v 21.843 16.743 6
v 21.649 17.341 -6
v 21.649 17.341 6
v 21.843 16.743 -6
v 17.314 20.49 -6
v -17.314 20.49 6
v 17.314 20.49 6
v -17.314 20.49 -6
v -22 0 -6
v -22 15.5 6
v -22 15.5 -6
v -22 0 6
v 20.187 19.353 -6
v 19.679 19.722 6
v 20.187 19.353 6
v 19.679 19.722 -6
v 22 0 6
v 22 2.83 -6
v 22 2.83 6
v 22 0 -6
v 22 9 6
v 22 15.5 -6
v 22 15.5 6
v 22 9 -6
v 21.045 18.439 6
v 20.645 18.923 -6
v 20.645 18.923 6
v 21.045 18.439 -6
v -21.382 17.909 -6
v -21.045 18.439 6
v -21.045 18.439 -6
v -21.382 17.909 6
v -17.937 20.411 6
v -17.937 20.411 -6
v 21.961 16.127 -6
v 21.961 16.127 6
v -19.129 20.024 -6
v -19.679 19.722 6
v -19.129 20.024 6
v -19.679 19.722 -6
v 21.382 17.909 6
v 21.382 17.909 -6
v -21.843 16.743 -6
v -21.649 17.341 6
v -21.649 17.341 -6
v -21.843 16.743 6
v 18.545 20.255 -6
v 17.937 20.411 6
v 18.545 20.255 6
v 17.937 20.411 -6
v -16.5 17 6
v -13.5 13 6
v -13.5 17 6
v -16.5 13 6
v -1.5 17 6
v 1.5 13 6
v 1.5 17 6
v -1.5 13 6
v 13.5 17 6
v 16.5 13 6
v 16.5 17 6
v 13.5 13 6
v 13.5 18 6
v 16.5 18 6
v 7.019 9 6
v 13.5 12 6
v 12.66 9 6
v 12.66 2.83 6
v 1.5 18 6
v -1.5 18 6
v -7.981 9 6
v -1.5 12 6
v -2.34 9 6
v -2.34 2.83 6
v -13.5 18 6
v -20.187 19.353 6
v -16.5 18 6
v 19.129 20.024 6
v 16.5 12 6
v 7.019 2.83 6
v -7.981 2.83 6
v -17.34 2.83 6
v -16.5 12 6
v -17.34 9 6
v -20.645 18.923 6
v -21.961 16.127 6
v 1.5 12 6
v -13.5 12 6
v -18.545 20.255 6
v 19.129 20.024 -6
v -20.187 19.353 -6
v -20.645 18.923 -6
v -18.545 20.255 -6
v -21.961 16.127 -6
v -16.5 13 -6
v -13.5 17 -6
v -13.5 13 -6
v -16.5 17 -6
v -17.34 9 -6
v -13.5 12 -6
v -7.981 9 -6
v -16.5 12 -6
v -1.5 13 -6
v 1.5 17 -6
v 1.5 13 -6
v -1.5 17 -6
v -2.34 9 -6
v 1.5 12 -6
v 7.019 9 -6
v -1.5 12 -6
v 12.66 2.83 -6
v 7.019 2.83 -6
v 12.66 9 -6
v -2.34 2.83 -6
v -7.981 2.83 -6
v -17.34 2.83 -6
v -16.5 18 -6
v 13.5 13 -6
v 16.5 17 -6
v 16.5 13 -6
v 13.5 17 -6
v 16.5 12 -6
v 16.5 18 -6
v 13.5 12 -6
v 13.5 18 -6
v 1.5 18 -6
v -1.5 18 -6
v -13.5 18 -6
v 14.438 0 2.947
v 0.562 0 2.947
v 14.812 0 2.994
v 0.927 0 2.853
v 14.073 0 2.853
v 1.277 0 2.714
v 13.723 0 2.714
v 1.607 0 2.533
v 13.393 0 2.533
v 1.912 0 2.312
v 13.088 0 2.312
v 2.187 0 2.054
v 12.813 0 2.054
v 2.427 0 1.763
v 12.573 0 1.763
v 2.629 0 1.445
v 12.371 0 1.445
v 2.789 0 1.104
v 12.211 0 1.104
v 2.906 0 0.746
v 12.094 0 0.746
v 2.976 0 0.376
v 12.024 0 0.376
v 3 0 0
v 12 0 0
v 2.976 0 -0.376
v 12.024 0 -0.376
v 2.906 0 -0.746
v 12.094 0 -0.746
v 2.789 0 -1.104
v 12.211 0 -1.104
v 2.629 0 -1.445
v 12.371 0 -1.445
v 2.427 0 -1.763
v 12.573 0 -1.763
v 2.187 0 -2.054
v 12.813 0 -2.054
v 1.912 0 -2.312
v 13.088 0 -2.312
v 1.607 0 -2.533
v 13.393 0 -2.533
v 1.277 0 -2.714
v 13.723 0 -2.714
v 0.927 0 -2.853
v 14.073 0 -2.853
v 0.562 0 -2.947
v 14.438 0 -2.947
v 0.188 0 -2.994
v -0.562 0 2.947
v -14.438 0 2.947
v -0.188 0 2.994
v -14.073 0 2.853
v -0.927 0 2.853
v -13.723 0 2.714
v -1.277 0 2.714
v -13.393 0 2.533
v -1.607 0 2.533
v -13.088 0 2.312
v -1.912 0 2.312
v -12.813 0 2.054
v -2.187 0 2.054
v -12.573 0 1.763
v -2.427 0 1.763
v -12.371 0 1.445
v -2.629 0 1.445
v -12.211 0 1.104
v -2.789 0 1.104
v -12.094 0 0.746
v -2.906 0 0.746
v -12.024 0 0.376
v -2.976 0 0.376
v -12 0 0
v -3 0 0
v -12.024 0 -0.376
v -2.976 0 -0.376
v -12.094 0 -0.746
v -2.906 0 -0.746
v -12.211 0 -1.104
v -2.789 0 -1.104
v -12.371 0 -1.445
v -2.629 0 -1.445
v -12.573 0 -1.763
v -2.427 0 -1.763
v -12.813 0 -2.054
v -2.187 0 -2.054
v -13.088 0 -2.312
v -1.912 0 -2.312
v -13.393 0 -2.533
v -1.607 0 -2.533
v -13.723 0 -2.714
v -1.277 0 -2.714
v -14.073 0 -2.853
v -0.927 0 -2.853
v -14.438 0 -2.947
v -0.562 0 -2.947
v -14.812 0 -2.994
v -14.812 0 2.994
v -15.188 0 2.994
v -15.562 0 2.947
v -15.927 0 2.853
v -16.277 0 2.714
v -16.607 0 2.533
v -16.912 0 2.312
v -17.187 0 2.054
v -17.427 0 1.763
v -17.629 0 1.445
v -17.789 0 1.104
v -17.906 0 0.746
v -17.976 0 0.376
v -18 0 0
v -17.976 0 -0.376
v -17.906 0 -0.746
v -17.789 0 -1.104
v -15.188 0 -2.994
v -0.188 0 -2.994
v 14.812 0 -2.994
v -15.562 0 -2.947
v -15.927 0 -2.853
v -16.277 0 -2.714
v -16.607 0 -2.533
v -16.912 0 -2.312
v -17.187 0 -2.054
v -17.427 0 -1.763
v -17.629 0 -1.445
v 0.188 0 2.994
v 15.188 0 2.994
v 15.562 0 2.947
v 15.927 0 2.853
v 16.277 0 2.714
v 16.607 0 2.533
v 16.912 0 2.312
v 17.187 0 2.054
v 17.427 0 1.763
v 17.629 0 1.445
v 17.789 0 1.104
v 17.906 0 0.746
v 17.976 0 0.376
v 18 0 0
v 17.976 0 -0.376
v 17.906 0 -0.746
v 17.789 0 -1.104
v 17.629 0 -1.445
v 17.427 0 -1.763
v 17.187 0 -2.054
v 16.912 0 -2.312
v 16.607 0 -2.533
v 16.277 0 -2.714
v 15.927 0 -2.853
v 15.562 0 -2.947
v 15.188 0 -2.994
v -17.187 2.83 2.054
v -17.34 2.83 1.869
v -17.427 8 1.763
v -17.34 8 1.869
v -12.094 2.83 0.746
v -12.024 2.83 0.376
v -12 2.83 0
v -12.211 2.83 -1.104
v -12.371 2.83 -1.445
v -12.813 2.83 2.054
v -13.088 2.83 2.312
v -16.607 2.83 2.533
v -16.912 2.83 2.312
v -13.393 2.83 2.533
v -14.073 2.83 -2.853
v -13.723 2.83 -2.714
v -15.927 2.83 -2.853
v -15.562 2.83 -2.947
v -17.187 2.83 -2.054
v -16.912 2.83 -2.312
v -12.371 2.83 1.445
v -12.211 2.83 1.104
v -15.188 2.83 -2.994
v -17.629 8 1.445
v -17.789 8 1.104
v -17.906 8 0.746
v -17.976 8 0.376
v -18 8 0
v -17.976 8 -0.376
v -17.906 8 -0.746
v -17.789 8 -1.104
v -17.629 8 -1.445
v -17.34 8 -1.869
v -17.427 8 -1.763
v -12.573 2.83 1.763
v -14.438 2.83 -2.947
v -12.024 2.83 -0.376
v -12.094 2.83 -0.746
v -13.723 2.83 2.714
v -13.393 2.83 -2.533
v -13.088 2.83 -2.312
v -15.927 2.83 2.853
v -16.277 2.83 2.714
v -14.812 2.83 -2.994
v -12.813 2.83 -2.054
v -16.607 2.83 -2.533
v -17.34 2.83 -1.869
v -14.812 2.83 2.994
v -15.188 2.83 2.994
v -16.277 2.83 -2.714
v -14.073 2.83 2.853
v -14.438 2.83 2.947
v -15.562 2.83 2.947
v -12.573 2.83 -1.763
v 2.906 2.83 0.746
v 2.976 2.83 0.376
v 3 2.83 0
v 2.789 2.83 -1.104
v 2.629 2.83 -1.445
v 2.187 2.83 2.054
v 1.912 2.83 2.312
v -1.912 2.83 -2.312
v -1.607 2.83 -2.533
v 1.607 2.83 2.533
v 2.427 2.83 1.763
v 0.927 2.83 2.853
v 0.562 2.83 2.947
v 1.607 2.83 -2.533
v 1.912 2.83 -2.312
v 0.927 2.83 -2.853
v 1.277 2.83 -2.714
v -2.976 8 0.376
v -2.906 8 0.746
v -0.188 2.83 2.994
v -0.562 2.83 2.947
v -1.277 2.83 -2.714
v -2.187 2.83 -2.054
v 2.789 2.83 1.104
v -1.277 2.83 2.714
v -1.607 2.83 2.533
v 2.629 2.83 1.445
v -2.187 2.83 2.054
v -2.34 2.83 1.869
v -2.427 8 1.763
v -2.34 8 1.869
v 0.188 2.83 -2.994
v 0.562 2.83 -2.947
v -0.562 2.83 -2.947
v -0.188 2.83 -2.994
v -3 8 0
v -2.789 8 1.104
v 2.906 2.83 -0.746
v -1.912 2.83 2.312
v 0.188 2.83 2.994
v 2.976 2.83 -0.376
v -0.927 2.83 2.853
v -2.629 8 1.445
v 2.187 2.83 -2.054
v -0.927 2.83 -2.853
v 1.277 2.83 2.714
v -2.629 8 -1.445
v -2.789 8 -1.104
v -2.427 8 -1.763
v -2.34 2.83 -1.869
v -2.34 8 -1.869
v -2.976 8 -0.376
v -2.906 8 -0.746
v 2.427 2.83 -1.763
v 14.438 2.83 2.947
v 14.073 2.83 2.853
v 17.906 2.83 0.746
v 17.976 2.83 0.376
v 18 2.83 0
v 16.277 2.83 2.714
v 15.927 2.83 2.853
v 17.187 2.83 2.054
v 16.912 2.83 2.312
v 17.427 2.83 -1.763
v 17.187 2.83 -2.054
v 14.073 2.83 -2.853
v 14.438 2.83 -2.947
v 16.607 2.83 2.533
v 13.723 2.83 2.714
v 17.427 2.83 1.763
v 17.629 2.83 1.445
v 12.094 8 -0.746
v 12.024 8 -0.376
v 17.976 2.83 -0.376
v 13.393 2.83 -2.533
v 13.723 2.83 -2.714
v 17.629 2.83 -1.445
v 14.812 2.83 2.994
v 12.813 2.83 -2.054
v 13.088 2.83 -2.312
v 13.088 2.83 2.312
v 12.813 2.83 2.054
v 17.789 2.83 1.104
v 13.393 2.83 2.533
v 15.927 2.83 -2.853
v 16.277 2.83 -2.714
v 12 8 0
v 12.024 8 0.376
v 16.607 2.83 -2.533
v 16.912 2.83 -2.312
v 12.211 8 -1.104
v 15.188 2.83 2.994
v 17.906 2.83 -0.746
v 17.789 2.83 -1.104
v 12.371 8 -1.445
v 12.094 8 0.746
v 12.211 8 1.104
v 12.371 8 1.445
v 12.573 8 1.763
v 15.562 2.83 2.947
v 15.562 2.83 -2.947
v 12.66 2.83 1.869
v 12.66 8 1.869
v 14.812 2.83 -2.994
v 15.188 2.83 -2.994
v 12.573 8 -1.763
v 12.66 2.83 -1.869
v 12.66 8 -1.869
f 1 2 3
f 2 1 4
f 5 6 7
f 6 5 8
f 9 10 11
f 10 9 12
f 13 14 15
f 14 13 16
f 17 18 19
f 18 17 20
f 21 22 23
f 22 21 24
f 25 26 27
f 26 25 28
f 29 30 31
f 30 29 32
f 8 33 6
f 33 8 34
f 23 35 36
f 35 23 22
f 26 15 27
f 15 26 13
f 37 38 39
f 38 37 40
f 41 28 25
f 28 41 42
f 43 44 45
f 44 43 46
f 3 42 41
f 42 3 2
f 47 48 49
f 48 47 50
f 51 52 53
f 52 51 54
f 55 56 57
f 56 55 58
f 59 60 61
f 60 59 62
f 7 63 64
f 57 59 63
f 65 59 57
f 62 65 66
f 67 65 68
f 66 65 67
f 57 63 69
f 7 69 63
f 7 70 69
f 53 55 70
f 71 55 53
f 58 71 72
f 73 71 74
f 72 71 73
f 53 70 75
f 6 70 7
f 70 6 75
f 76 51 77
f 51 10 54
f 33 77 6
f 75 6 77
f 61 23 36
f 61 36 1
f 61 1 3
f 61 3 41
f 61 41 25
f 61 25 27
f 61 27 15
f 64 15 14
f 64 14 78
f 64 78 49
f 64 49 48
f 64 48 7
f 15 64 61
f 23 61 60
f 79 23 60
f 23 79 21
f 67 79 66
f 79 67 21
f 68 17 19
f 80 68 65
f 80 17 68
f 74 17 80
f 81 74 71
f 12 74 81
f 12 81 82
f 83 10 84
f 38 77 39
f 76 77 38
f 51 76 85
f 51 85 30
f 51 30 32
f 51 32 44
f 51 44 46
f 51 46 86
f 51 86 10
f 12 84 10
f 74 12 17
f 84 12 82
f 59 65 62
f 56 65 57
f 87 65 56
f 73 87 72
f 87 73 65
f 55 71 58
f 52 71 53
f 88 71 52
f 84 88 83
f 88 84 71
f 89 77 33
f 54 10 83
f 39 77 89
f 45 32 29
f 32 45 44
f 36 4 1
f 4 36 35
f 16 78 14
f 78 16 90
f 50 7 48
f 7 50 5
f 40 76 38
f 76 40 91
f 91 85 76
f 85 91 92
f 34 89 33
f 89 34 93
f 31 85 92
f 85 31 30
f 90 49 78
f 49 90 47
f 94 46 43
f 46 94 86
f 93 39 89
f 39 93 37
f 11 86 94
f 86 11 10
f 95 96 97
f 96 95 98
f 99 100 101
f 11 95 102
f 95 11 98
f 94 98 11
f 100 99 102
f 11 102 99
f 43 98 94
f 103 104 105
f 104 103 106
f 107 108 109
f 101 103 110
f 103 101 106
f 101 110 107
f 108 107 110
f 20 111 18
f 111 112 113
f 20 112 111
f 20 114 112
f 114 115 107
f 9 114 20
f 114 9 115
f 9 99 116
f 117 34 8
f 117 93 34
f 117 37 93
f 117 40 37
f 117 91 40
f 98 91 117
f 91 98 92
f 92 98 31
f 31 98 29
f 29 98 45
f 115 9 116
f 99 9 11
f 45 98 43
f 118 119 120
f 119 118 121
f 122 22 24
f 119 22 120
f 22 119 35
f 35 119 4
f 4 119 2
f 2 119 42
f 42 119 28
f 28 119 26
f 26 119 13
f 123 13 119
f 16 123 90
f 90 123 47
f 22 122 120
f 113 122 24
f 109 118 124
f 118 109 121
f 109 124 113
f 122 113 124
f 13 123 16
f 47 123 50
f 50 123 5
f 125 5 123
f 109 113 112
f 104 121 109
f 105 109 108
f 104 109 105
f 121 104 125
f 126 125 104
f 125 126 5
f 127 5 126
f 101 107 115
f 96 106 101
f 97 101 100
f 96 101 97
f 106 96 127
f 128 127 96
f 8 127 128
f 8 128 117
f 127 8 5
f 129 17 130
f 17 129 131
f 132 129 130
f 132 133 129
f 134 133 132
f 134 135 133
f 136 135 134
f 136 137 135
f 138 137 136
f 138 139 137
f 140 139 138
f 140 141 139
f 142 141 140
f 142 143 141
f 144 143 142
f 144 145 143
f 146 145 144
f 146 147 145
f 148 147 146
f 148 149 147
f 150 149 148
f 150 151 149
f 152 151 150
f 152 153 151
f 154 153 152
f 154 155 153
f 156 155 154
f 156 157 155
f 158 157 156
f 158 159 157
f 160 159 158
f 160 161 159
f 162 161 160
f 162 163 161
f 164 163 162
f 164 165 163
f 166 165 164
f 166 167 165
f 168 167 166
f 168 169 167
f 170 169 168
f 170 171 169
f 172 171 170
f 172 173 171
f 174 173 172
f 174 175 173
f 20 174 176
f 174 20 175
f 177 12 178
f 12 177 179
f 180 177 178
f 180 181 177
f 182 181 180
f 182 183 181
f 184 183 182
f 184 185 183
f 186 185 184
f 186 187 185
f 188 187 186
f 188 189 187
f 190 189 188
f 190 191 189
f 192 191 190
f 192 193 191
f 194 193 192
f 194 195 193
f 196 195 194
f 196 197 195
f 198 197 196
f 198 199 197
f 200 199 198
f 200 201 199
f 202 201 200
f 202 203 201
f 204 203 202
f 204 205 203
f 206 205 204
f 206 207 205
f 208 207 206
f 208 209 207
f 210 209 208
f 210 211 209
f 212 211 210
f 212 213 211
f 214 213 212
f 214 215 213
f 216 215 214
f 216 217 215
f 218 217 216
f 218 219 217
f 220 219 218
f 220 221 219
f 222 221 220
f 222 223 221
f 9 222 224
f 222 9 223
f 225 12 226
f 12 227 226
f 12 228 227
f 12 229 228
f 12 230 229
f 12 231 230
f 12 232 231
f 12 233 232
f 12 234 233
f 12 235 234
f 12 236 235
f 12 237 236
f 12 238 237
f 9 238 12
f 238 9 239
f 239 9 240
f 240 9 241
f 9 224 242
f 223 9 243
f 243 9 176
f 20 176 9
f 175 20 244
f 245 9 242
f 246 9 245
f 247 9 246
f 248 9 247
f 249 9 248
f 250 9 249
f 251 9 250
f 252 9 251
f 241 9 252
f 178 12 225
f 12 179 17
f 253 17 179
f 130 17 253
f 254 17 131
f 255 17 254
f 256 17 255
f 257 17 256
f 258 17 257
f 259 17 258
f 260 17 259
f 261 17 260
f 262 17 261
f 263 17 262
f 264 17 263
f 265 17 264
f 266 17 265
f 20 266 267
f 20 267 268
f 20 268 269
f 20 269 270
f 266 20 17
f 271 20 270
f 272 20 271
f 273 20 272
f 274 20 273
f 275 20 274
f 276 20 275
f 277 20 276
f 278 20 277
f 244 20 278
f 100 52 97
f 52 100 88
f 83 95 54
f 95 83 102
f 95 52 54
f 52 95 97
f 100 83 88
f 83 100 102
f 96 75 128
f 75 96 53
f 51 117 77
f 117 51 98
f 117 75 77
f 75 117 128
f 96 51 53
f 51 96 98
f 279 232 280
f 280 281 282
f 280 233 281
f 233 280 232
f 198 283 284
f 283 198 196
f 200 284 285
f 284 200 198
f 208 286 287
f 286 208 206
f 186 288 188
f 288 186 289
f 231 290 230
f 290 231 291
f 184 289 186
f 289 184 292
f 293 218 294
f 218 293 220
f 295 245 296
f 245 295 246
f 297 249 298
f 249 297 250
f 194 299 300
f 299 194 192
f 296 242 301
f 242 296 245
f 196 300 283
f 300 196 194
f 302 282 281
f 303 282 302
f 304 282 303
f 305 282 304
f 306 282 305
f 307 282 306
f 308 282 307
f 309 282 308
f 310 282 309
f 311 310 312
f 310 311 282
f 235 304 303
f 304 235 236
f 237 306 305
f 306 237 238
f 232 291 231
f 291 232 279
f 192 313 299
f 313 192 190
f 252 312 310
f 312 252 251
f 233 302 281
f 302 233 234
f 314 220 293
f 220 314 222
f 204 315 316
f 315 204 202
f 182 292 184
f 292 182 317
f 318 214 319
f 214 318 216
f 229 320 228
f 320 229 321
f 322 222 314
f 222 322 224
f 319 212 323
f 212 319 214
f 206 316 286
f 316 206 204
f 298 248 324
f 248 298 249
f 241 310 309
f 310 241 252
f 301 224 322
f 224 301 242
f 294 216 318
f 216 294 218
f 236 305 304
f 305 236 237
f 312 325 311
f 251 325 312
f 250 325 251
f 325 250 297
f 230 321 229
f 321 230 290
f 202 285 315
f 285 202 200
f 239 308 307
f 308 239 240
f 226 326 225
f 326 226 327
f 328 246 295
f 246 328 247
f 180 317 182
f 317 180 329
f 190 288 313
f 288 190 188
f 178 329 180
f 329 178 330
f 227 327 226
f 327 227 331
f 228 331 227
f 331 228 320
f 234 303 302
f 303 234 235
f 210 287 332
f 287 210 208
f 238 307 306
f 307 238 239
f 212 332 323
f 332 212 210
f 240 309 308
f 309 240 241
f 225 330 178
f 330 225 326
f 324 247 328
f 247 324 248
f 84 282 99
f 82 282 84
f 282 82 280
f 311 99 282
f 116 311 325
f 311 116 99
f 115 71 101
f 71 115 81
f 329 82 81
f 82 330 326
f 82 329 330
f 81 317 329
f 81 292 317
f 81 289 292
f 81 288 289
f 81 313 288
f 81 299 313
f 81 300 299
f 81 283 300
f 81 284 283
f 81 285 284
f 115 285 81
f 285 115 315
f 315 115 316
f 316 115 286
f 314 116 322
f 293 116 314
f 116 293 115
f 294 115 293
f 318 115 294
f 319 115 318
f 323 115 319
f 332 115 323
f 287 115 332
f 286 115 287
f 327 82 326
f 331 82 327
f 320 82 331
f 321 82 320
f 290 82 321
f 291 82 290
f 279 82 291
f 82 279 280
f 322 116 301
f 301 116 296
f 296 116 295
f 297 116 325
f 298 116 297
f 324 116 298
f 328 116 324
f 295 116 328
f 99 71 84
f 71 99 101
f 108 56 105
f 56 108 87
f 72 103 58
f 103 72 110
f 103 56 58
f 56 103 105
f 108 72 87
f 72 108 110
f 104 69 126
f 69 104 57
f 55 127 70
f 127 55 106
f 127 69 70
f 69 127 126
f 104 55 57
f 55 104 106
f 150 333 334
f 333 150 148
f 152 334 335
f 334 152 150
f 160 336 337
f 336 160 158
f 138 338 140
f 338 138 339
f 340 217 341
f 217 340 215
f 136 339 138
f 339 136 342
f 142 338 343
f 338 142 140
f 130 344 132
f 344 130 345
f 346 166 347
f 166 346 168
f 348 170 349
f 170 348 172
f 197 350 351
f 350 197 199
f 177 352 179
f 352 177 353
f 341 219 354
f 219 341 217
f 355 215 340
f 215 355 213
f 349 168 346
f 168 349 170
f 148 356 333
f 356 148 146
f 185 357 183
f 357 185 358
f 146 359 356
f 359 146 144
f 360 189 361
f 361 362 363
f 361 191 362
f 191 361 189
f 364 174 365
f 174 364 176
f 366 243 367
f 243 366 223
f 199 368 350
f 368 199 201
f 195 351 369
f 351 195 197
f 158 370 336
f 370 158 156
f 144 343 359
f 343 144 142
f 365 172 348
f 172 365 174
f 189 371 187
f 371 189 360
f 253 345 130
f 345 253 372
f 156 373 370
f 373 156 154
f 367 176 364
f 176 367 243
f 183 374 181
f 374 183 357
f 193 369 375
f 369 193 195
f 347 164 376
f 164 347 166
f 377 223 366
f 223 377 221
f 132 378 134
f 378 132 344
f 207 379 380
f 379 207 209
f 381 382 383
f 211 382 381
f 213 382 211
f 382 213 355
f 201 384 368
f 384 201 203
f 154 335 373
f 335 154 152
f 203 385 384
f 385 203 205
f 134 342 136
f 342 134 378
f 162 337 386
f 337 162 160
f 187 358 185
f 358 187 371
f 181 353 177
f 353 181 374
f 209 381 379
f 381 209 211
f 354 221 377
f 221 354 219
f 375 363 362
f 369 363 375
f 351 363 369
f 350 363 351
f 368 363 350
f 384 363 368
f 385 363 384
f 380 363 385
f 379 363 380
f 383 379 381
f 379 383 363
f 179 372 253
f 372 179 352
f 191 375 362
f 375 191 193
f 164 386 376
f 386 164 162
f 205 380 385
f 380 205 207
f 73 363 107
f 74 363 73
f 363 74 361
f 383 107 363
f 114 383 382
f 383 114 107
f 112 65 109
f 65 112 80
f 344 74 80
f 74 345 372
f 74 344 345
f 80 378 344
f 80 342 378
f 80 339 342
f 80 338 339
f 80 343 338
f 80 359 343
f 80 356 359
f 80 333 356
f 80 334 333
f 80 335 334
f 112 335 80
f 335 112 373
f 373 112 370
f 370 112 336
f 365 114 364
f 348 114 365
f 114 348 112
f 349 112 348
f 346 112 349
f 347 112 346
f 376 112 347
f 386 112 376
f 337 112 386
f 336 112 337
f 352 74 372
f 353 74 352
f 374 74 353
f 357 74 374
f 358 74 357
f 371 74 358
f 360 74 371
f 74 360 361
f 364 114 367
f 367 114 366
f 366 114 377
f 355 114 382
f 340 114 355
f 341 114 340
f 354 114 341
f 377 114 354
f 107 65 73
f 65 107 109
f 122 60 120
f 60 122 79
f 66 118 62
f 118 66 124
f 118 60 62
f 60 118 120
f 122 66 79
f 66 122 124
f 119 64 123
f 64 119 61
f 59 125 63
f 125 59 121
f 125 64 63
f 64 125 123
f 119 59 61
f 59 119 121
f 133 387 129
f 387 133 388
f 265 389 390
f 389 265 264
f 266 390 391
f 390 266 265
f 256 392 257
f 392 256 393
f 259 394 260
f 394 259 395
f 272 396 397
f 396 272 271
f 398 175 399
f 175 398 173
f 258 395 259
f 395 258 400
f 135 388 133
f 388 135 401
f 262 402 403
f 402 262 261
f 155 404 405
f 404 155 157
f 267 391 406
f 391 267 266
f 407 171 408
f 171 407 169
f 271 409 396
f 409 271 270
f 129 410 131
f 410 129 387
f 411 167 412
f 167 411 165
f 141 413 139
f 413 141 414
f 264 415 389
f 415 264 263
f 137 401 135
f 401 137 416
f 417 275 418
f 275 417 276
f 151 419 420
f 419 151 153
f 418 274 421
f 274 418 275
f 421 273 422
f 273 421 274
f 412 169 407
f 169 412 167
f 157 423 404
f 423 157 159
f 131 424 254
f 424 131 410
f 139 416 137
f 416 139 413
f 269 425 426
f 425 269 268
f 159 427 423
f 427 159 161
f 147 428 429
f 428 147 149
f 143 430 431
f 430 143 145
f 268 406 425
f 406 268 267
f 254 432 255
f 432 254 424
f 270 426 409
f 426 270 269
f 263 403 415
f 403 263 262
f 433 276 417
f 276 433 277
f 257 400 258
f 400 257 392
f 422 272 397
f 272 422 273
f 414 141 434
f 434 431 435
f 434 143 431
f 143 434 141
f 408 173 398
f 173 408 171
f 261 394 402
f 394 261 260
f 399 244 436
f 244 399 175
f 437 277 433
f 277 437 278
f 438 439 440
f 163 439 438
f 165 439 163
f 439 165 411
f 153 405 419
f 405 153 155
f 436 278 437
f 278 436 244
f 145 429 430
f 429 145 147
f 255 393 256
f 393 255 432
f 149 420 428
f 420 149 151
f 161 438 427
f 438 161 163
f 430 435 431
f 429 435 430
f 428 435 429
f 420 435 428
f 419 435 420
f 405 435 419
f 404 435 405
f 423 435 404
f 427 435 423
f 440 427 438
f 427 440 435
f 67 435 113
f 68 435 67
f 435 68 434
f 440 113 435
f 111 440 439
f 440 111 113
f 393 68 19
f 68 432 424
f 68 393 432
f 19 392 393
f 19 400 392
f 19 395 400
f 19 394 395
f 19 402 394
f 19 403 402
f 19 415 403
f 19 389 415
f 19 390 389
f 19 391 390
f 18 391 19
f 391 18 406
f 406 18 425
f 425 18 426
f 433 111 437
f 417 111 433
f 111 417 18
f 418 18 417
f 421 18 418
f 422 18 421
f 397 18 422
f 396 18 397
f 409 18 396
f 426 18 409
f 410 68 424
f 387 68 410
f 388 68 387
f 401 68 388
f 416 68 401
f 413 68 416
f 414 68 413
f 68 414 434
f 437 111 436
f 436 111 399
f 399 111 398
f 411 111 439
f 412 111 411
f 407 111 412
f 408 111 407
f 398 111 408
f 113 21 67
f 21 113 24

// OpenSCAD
$fn = 50;


difference() {
	union() {
		translate(v = [0, 13.5000000000, -6.0000000000]) {
			rotate(a = [0, 0, 0]) {
				hull() {
					translate(v = [-17.0000000000, 2.0000000000, 0]) {
						rotate(a = [0, 0, 0]) {
							translate(v = [0, 0, 0]) {
								rotate(a = [0, 0, 0]) {
									cylinder(h = 12, r = 5);
								}
							}
						}
					}
					translate(v = [17.0000000000, 2.0000000000, 0]) {
						rotate(a = [0, 0, 0]) {
							translate(v = [0, 0, 0]) {
								rotate(a = [0, 0, 0]) {
									cylinder(h = 12, r = 5);
								}
							}
						}
					}
					translate(v = [-17.0000000000, -2.0000000000, 0]) {
						rotate(a = [0, 0, 0]) {
							translate(v = [0, 0, 0]) {
								rotate(a = [0, 0, 0]) {
									cylinder(h = 12, r = 5);
								}
							}
						}
					}
					translate(v = [17.0000000000, -2.0000000000, 0]) {
						rotate(a = [0, 0, 0]) {
							translate(v = [0, 0, 0]) {
								rotate(a = [0, 0, 0]) {
									cylinder(h = 12, r = 5);
								}
							}
						}
					}
				}
			}
		}
		translate(v = [-22.0000000000, 0, -6.0000000000]) {
			rotate(a = [0, 0, 0]) {
				cube(size = [44, 13.5000000000, 12]);
			}
		}
	}
	union() {
		translate(v = [-16.5000000000, 12.0000000000, -50]) {
			rotate(a = [0, 0, 0]) {
				cube(size = [3, 1, 100]);
			}
		}
		translate(v = [-16.5000000000, 17.0000000000, -50]) {
			rotate(a = [0, 0, 0]) {
				cube(size = [3, 1, 100]);
			}
		}
		translate(v = [-15.0000000000, 8, 0]) {
			rotate(a = [90, 0, 0]) {
				cylinder(h = 8, r = 3.0000000000);
			}
		}
		translate(v = [-17.3396880416, 9, -25]) {
			rotate(a = [90, 0, 0]) {
				cube(size = [9.3587521664, 100, 6.1700000000]);
			}
		}
		translate(v = [-1.5000000000, 12.0000000000, -50]) {
			rotate(a = [0, 0, 0]) {
				cube(size = [3, 1, 100]);
			}
		}
		translate(v = [-1.5000000000, 17.0000000000, -50]) {
			rotate(a = [0, 0, 0]) {
				cube(size = [3, 1, 100]);
			}
		}
		translate(v = [0.0000000000, 8, 0]) {
			rotate(a = [90, 0, 0]) {
				cylinder(h = 8, r = 3.0000000000);
			}
		}
		translate(v = [-2.3396880416, 9, -25]) {
			rotate(a = [90, 0, 0]) {
				cube(size = [9.3587521664, 100, 6.1700000000]);
			}
		}
		translate(v = [13.5000000000, 12.0000000000, -50]) {
			rotate(a = [0, 0, 0]) {
				cube(size = [3, 1, 100]);
			}
		}
		translate(v = [13.5000000000, 17.0000000000, -50]) {
			rotate(a = [0, 0, 0]) {
				cube(size = [3, 1, 100]);
			}
		}
		translate(v = [15.0000000000, 8, 0]) {
			rotate(a = [90, 0, 0]) {
				cylinder(h = 8, r = 3.0000000000);
			}
		}
		translate(v = [12.6603119584, 9, -25]) {
			rotate(a = [90, 0, 0]) {
				cube(size = [9.3587521664, 100, 6.1700000000]);
			}
		}
	}
}
